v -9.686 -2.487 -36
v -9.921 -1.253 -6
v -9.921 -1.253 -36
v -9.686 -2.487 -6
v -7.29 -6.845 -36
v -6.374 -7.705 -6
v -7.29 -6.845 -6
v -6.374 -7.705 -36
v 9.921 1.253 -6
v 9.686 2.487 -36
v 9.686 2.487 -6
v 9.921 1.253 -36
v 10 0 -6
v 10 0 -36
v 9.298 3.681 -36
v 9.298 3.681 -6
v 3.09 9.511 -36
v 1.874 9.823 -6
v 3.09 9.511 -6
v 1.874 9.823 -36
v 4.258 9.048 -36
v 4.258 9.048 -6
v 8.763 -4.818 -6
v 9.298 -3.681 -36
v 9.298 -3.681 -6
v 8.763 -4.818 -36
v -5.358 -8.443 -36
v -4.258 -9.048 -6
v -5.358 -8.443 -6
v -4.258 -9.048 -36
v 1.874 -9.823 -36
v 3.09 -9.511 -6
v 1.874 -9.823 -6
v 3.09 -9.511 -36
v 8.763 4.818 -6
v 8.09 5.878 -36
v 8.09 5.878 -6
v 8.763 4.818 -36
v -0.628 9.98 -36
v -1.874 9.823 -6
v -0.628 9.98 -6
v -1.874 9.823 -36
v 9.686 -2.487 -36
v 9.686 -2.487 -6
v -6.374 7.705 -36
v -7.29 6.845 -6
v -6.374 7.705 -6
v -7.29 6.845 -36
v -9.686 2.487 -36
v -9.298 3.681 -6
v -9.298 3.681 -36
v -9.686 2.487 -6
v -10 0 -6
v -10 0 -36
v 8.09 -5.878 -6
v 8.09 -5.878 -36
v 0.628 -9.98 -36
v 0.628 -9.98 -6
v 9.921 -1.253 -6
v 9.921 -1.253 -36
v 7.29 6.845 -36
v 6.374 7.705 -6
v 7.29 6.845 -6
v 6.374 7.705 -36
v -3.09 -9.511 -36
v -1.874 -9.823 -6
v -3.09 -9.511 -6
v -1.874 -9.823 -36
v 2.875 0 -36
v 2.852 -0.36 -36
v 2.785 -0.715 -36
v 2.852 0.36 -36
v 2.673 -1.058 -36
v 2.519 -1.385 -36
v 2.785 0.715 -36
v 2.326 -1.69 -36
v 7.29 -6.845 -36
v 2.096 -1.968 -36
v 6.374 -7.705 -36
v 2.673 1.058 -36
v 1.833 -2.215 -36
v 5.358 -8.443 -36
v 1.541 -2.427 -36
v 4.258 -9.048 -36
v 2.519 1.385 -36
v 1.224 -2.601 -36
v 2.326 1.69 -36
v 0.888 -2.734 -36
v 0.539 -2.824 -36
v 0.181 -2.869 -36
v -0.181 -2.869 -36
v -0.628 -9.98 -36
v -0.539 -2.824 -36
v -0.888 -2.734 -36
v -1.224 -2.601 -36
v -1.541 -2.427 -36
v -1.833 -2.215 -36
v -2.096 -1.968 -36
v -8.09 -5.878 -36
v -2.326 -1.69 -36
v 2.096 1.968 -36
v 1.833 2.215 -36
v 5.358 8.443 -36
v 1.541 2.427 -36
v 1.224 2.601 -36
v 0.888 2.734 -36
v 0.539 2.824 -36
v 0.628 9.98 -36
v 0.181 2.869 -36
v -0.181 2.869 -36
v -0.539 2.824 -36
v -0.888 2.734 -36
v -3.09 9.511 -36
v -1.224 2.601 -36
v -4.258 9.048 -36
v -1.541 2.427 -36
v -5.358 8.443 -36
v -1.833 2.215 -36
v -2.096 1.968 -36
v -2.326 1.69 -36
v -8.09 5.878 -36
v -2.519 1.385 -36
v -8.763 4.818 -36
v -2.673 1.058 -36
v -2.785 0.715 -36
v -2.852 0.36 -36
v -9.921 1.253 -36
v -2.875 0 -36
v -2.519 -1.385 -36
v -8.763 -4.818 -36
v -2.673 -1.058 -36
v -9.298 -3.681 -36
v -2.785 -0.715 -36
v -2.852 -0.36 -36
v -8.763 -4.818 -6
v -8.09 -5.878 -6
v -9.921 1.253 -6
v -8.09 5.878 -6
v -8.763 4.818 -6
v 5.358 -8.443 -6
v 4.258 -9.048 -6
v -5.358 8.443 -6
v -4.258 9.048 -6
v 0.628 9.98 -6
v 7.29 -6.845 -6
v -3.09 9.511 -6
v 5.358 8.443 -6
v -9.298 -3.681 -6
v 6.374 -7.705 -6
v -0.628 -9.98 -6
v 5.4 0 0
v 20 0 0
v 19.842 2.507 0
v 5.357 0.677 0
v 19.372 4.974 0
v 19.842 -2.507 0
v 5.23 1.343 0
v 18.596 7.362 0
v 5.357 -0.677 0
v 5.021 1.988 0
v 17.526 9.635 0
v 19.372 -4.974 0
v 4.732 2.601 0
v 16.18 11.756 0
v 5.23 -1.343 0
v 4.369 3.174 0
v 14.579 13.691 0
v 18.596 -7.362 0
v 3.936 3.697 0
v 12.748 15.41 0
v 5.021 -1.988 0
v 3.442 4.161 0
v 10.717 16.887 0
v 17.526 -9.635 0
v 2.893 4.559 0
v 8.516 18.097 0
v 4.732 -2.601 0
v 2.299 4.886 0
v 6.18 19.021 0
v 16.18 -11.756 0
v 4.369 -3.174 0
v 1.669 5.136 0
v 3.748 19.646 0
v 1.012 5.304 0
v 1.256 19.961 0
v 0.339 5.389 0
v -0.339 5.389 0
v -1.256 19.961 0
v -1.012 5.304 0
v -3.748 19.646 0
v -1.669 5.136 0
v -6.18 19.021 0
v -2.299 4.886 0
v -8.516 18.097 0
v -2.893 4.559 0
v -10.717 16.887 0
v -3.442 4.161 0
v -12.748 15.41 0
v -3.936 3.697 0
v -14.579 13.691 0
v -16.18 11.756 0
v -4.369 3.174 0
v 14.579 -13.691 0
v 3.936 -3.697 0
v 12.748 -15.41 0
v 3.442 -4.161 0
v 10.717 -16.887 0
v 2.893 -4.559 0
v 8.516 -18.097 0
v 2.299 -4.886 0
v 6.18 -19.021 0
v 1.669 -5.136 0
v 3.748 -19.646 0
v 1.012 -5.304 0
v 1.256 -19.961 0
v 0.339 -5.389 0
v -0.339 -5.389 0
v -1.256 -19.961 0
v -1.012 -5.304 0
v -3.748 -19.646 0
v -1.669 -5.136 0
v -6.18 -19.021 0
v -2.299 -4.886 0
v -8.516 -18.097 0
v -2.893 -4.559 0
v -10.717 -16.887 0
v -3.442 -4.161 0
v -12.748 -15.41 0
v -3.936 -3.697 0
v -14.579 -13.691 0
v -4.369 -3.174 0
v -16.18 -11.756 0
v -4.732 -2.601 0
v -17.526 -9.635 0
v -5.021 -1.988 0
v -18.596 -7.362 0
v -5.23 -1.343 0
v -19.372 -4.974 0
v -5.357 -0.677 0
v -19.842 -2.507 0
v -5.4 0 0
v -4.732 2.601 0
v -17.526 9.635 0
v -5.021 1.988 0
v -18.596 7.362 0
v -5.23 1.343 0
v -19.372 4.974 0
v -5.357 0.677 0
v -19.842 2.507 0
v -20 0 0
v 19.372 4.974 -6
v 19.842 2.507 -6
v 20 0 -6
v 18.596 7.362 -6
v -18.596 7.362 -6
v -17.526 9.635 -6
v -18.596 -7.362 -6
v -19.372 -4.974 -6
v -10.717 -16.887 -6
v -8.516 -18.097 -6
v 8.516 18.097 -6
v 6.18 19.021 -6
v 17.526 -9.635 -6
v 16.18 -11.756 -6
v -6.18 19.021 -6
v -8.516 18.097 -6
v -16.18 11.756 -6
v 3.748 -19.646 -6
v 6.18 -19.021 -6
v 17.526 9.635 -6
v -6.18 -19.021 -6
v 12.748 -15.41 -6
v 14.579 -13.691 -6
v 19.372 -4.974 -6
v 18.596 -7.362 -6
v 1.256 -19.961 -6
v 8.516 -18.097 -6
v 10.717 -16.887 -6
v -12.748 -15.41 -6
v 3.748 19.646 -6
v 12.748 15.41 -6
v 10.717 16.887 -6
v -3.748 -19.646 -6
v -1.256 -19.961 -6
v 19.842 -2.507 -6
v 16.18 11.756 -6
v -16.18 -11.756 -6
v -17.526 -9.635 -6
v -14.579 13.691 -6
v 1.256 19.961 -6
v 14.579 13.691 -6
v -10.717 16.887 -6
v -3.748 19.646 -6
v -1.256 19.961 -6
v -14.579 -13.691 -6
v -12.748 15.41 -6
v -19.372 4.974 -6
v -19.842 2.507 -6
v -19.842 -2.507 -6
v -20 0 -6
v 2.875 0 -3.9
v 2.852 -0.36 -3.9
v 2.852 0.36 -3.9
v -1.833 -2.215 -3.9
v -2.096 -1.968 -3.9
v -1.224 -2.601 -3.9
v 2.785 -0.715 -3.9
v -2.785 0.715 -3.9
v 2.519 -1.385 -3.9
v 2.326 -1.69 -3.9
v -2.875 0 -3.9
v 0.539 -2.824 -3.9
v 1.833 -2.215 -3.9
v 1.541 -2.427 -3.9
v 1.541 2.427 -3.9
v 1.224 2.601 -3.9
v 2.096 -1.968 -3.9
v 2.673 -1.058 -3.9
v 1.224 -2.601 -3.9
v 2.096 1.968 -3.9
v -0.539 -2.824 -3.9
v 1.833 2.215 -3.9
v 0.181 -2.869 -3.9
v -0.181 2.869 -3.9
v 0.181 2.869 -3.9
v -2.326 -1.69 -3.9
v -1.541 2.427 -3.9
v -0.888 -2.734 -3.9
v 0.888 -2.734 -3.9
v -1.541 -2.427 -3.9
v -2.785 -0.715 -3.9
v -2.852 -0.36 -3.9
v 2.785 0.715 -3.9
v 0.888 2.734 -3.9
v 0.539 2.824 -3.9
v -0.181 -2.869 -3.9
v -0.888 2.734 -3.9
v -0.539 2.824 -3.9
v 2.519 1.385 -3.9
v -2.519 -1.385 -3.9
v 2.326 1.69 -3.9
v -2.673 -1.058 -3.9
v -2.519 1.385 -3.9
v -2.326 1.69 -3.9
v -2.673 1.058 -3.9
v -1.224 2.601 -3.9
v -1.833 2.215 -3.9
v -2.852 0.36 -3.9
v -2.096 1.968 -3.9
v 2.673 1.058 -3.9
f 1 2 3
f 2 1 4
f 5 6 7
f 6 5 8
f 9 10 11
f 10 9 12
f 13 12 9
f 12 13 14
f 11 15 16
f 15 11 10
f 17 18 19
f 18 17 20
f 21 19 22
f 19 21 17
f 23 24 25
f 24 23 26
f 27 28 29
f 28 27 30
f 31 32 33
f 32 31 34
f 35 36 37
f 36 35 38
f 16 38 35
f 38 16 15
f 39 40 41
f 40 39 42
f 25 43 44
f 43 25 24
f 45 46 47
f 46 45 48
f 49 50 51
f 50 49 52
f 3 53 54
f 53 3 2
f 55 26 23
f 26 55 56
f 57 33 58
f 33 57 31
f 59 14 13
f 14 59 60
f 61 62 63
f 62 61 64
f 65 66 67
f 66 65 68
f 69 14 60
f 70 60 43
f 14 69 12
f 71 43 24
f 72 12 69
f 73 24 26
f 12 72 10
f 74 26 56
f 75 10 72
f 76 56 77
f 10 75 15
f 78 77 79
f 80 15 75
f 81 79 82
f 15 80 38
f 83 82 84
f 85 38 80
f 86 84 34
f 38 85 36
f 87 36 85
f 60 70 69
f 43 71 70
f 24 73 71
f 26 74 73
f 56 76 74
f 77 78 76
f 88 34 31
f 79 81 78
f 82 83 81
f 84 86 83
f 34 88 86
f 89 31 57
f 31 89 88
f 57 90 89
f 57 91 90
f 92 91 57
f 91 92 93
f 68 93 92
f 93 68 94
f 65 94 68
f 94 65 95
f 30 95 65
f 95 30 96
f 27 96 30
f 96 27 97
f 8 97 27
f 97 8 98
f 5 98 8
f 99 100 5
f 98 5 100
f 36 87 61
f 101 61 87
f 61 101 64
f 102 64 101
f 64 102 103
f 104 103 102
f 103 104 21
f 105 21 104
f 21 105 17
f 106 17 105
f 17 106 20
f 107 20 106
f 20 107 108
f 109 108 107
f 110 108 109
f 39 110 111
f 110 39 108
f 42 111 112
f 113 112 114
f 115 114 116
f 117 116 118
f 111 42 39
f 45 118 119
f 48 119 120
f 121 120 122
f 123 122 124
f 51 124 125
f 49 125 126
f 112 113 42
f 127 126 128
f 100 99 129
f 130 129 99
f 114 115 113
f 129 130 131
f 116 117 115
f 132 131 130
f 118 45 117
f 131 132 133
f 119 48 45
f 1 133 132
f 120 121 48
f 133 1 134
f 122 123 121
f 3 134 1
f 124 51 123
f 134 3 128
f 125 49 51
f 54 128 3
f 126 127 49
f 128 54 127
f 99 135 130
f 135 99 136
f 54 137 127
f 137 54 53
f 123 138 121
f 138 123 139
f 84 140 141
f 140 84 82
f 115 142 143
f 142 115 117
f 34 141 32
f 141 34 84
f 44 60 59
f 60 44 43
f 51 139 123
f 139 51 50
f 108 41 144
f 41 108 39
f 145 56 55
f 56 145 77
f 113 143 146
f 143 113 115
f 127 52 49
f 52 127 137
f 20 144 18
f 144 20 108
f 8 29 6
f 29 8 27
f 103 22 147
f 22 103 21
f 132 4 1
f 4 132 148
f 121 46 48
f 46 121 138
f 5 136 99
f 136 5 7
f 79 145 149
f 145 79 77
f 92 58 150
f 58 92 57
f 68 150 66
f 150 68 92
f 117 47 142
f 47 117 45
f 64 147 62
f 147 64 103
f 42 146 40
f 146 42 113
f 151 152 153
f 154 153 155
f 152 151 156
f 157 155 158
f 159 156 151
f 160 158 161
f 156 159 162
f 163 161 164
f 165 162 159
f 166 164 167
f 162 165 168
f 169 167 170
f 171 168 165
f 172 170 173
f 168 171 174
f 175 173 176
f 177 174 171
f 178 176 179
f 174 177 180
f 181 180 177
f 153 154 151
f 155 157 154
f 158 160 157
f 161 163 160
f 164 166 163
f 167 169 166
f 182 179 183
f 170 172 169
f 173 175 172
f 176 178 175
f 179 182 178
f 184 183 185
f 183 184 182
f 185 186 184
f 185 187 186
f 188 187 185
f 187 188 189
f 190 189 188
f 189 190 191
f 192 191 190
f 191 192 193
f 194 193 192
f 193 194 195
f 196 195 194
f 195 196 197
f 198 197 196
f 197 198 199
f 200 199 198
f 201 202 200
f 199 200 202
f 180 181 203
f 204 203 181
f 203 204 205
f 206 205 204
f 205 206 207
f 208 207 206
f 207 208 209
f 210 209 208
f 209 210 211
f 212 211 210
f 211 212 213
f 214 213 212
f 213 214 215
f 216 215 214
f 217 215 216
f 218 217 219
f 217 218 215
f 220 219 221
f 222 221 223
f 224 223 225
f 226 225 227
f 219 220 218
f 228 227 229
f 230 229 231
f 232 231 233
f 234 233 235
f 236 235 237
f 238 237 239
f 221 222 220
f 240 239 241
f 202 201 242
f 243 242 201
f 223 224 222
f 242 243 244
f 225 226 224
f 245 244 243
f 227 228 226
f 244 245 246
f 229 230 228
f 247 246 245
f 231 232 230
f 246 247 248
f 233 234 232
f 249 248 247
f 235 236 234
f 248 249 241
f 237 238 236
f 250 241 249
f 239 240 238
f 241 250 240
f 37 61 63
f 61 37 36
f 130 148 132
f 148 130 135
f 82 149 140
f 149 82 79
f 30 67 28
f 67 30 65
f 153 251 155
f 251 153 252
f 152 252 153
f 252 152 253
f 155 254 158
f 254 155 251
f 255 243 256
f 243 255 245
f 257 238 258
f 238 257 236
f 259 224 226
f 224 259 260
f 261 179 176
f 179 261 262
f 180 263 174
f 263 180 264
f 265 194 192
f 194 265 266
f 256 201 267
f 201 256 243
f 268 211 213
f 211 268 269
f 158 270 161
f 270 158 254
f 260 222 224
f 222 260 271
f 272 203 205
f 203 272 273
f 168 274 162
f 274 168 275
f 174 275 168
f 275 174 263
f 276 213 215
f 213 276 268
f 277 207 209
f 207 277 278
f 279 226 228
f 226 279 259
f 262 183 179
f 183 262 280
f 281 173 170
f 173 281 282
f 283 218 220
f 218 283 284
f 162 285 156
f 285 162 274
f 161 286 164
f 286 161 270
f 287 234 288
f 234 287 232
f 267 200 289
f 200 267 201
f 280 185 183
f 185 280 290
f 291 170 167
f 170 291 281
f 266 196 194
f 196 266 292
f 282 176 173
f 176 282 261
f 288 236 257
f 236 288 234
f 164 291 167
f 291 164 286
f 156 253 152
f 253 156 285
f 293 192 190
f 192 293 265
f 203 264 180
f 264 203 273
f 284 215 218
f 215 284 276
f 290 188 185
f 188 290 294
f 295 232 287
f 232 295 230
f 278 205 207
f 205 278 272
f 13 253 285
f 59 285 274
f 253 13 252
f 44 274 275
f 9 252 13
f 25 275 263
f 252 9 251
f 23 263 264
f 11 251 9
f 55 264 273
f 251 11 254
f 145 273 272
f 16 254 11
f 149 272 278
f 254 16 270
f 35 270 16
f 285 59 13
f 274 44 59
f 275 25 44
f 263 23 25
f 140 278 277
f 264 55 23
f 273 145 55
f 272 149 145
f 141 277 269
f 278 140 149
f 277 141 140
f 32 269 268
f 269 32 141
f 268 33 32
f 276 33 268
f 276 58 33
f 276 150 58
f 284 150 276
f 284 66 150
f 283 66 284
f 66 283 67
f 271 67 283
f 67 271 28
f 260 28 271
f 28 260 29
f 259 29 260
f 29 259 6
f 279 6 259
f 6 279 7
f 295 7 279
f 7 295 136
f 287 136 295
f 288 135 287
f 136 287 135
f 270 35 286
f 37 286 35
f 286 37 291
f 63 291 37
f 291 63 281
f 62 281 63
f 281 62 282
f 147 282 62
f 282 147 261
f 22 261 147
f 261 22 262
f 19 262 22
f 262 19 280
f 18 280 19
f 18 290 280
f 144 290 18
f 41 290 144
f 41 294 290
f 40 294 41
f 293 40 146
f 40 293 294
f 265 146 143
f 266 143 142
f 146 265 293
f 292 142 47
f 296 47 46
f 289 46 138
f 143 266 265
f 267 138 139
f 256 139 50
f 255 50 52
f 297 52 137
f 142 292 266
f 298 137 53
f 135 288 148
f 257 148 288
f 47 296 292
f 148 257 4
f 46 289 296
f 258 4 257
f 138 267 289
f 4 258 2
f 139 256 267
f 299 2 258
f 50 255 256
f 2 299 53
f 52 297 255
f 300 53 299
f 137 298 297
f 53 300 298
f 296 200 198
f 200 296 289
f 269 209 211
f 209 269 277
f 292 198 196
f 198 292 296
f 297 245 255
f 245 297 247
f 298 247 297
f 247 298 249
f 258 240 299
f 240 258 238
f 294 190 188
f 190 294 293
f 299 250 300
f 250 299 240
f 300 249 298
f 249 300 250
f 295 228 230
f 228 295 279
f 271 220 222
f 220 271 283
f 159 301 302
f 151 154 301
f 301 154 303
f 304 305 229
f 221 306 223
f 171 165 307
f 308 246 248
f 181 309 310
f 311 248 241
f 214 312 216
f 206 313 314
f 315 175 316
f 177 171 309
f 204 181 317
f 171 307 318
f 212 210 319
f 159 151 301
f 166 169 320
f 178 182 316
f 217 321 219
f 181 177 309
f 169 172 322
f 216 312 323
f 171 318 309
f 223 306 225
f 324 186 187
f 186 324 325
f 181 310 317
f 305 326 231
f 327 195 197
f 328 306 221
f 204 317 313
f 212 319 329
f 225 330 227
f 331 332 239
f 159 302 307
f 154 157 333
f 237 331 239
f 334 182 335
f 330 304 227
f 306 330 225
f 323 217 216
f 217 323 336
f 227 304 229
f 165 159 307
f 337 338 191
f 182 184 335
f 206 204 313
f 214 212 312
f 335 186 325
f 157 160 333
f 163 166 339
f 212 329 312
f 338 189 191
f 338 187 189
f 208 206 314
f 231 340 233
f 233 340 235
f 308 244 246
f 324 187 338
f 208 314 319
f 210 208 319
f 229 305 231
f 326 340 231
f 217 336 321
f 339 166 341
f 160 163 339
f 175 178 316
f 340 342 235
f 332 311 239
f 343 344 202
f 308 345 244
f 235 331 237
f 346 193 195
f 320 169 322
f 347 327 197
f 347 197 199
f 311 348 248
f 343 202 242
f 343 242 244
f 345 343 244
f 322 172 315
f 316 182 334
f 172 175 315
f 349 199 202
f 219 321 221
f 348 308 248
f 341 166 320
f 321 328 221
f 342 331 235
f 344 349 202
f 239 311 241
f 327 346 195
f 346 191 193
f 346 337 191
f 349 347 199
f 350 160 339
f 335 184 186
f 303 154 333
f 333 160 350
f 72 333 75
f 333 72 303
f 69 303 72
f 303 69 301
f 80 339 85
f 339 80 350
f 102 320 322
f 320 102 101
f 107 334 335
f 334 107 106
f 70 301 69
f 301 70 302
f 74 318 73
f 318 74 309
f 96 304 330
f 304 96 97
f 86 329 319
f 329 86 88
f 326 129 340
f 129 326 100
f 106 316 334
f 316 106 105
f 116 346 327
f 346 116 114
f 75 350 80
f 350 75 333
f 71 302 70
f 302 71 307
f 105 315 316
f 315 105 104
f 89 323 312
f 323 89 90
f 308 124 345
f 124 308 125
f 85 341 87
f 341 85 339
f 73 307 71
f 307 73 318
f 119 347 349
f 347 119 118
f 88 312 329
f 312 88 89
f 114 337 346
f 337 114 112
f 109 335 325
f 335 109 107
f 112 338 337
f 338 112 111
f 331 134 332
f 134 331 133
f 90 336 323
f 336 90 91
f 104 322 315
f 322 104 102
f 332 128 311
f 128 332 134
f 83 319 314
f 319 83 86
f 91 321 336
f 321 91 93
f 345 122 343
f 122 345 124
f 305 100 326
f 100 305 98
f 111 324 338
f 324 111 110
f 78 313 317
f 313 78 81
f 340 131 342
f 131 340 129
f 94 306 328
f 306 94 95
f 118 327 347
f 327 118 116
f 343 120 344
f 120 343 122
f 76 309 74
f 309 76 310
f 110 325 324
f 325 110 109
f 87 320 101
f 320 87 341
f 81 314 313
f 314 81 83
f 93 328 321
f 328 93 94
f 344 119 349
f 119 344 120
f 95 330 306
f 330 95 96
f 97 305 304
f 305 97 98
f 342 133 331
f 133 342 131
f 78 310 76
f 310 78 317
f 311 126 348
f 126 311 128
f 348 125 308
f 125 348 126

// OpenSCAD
$fn = 50;


difference() {
	union() {
		translate(v = [0, 0, -36.0000000000]) {
			cylinder(h = 36, r = 10.0000000000);
		}
		translate(v = [0, 0, -6.0000000000]) {
			cylinder(h = 6, r = 20.0000000000);
		}
	}
	union() {
		translate(v = [0, 0, 0]) {
			rotate(a = [0, 0, 0]) {
				difference() {
					union() {
						#translate(v = [0, 0, -36.0000000000]) {
							cylinder(h = 36, r = 2.6000000000);
						}
						#translate(v = [0, 0, -3.9000000000]) {
							cylinder(h = 3.9000000000, r = 10.0000000000, r1 = 2.8750000000, r2 = 5.4000000000);
						}
						#translate(v = [0, 0, -36.0000000000]) {
							cylinder(h = 36, r = 2.8750000000);
						}
						#translate(v = [0, 0, -36.0000000000]) {
							cylinder(h = 36, r = 2.6000000000);
						}
					}
					union();
				}
			}
		}
	}
}
